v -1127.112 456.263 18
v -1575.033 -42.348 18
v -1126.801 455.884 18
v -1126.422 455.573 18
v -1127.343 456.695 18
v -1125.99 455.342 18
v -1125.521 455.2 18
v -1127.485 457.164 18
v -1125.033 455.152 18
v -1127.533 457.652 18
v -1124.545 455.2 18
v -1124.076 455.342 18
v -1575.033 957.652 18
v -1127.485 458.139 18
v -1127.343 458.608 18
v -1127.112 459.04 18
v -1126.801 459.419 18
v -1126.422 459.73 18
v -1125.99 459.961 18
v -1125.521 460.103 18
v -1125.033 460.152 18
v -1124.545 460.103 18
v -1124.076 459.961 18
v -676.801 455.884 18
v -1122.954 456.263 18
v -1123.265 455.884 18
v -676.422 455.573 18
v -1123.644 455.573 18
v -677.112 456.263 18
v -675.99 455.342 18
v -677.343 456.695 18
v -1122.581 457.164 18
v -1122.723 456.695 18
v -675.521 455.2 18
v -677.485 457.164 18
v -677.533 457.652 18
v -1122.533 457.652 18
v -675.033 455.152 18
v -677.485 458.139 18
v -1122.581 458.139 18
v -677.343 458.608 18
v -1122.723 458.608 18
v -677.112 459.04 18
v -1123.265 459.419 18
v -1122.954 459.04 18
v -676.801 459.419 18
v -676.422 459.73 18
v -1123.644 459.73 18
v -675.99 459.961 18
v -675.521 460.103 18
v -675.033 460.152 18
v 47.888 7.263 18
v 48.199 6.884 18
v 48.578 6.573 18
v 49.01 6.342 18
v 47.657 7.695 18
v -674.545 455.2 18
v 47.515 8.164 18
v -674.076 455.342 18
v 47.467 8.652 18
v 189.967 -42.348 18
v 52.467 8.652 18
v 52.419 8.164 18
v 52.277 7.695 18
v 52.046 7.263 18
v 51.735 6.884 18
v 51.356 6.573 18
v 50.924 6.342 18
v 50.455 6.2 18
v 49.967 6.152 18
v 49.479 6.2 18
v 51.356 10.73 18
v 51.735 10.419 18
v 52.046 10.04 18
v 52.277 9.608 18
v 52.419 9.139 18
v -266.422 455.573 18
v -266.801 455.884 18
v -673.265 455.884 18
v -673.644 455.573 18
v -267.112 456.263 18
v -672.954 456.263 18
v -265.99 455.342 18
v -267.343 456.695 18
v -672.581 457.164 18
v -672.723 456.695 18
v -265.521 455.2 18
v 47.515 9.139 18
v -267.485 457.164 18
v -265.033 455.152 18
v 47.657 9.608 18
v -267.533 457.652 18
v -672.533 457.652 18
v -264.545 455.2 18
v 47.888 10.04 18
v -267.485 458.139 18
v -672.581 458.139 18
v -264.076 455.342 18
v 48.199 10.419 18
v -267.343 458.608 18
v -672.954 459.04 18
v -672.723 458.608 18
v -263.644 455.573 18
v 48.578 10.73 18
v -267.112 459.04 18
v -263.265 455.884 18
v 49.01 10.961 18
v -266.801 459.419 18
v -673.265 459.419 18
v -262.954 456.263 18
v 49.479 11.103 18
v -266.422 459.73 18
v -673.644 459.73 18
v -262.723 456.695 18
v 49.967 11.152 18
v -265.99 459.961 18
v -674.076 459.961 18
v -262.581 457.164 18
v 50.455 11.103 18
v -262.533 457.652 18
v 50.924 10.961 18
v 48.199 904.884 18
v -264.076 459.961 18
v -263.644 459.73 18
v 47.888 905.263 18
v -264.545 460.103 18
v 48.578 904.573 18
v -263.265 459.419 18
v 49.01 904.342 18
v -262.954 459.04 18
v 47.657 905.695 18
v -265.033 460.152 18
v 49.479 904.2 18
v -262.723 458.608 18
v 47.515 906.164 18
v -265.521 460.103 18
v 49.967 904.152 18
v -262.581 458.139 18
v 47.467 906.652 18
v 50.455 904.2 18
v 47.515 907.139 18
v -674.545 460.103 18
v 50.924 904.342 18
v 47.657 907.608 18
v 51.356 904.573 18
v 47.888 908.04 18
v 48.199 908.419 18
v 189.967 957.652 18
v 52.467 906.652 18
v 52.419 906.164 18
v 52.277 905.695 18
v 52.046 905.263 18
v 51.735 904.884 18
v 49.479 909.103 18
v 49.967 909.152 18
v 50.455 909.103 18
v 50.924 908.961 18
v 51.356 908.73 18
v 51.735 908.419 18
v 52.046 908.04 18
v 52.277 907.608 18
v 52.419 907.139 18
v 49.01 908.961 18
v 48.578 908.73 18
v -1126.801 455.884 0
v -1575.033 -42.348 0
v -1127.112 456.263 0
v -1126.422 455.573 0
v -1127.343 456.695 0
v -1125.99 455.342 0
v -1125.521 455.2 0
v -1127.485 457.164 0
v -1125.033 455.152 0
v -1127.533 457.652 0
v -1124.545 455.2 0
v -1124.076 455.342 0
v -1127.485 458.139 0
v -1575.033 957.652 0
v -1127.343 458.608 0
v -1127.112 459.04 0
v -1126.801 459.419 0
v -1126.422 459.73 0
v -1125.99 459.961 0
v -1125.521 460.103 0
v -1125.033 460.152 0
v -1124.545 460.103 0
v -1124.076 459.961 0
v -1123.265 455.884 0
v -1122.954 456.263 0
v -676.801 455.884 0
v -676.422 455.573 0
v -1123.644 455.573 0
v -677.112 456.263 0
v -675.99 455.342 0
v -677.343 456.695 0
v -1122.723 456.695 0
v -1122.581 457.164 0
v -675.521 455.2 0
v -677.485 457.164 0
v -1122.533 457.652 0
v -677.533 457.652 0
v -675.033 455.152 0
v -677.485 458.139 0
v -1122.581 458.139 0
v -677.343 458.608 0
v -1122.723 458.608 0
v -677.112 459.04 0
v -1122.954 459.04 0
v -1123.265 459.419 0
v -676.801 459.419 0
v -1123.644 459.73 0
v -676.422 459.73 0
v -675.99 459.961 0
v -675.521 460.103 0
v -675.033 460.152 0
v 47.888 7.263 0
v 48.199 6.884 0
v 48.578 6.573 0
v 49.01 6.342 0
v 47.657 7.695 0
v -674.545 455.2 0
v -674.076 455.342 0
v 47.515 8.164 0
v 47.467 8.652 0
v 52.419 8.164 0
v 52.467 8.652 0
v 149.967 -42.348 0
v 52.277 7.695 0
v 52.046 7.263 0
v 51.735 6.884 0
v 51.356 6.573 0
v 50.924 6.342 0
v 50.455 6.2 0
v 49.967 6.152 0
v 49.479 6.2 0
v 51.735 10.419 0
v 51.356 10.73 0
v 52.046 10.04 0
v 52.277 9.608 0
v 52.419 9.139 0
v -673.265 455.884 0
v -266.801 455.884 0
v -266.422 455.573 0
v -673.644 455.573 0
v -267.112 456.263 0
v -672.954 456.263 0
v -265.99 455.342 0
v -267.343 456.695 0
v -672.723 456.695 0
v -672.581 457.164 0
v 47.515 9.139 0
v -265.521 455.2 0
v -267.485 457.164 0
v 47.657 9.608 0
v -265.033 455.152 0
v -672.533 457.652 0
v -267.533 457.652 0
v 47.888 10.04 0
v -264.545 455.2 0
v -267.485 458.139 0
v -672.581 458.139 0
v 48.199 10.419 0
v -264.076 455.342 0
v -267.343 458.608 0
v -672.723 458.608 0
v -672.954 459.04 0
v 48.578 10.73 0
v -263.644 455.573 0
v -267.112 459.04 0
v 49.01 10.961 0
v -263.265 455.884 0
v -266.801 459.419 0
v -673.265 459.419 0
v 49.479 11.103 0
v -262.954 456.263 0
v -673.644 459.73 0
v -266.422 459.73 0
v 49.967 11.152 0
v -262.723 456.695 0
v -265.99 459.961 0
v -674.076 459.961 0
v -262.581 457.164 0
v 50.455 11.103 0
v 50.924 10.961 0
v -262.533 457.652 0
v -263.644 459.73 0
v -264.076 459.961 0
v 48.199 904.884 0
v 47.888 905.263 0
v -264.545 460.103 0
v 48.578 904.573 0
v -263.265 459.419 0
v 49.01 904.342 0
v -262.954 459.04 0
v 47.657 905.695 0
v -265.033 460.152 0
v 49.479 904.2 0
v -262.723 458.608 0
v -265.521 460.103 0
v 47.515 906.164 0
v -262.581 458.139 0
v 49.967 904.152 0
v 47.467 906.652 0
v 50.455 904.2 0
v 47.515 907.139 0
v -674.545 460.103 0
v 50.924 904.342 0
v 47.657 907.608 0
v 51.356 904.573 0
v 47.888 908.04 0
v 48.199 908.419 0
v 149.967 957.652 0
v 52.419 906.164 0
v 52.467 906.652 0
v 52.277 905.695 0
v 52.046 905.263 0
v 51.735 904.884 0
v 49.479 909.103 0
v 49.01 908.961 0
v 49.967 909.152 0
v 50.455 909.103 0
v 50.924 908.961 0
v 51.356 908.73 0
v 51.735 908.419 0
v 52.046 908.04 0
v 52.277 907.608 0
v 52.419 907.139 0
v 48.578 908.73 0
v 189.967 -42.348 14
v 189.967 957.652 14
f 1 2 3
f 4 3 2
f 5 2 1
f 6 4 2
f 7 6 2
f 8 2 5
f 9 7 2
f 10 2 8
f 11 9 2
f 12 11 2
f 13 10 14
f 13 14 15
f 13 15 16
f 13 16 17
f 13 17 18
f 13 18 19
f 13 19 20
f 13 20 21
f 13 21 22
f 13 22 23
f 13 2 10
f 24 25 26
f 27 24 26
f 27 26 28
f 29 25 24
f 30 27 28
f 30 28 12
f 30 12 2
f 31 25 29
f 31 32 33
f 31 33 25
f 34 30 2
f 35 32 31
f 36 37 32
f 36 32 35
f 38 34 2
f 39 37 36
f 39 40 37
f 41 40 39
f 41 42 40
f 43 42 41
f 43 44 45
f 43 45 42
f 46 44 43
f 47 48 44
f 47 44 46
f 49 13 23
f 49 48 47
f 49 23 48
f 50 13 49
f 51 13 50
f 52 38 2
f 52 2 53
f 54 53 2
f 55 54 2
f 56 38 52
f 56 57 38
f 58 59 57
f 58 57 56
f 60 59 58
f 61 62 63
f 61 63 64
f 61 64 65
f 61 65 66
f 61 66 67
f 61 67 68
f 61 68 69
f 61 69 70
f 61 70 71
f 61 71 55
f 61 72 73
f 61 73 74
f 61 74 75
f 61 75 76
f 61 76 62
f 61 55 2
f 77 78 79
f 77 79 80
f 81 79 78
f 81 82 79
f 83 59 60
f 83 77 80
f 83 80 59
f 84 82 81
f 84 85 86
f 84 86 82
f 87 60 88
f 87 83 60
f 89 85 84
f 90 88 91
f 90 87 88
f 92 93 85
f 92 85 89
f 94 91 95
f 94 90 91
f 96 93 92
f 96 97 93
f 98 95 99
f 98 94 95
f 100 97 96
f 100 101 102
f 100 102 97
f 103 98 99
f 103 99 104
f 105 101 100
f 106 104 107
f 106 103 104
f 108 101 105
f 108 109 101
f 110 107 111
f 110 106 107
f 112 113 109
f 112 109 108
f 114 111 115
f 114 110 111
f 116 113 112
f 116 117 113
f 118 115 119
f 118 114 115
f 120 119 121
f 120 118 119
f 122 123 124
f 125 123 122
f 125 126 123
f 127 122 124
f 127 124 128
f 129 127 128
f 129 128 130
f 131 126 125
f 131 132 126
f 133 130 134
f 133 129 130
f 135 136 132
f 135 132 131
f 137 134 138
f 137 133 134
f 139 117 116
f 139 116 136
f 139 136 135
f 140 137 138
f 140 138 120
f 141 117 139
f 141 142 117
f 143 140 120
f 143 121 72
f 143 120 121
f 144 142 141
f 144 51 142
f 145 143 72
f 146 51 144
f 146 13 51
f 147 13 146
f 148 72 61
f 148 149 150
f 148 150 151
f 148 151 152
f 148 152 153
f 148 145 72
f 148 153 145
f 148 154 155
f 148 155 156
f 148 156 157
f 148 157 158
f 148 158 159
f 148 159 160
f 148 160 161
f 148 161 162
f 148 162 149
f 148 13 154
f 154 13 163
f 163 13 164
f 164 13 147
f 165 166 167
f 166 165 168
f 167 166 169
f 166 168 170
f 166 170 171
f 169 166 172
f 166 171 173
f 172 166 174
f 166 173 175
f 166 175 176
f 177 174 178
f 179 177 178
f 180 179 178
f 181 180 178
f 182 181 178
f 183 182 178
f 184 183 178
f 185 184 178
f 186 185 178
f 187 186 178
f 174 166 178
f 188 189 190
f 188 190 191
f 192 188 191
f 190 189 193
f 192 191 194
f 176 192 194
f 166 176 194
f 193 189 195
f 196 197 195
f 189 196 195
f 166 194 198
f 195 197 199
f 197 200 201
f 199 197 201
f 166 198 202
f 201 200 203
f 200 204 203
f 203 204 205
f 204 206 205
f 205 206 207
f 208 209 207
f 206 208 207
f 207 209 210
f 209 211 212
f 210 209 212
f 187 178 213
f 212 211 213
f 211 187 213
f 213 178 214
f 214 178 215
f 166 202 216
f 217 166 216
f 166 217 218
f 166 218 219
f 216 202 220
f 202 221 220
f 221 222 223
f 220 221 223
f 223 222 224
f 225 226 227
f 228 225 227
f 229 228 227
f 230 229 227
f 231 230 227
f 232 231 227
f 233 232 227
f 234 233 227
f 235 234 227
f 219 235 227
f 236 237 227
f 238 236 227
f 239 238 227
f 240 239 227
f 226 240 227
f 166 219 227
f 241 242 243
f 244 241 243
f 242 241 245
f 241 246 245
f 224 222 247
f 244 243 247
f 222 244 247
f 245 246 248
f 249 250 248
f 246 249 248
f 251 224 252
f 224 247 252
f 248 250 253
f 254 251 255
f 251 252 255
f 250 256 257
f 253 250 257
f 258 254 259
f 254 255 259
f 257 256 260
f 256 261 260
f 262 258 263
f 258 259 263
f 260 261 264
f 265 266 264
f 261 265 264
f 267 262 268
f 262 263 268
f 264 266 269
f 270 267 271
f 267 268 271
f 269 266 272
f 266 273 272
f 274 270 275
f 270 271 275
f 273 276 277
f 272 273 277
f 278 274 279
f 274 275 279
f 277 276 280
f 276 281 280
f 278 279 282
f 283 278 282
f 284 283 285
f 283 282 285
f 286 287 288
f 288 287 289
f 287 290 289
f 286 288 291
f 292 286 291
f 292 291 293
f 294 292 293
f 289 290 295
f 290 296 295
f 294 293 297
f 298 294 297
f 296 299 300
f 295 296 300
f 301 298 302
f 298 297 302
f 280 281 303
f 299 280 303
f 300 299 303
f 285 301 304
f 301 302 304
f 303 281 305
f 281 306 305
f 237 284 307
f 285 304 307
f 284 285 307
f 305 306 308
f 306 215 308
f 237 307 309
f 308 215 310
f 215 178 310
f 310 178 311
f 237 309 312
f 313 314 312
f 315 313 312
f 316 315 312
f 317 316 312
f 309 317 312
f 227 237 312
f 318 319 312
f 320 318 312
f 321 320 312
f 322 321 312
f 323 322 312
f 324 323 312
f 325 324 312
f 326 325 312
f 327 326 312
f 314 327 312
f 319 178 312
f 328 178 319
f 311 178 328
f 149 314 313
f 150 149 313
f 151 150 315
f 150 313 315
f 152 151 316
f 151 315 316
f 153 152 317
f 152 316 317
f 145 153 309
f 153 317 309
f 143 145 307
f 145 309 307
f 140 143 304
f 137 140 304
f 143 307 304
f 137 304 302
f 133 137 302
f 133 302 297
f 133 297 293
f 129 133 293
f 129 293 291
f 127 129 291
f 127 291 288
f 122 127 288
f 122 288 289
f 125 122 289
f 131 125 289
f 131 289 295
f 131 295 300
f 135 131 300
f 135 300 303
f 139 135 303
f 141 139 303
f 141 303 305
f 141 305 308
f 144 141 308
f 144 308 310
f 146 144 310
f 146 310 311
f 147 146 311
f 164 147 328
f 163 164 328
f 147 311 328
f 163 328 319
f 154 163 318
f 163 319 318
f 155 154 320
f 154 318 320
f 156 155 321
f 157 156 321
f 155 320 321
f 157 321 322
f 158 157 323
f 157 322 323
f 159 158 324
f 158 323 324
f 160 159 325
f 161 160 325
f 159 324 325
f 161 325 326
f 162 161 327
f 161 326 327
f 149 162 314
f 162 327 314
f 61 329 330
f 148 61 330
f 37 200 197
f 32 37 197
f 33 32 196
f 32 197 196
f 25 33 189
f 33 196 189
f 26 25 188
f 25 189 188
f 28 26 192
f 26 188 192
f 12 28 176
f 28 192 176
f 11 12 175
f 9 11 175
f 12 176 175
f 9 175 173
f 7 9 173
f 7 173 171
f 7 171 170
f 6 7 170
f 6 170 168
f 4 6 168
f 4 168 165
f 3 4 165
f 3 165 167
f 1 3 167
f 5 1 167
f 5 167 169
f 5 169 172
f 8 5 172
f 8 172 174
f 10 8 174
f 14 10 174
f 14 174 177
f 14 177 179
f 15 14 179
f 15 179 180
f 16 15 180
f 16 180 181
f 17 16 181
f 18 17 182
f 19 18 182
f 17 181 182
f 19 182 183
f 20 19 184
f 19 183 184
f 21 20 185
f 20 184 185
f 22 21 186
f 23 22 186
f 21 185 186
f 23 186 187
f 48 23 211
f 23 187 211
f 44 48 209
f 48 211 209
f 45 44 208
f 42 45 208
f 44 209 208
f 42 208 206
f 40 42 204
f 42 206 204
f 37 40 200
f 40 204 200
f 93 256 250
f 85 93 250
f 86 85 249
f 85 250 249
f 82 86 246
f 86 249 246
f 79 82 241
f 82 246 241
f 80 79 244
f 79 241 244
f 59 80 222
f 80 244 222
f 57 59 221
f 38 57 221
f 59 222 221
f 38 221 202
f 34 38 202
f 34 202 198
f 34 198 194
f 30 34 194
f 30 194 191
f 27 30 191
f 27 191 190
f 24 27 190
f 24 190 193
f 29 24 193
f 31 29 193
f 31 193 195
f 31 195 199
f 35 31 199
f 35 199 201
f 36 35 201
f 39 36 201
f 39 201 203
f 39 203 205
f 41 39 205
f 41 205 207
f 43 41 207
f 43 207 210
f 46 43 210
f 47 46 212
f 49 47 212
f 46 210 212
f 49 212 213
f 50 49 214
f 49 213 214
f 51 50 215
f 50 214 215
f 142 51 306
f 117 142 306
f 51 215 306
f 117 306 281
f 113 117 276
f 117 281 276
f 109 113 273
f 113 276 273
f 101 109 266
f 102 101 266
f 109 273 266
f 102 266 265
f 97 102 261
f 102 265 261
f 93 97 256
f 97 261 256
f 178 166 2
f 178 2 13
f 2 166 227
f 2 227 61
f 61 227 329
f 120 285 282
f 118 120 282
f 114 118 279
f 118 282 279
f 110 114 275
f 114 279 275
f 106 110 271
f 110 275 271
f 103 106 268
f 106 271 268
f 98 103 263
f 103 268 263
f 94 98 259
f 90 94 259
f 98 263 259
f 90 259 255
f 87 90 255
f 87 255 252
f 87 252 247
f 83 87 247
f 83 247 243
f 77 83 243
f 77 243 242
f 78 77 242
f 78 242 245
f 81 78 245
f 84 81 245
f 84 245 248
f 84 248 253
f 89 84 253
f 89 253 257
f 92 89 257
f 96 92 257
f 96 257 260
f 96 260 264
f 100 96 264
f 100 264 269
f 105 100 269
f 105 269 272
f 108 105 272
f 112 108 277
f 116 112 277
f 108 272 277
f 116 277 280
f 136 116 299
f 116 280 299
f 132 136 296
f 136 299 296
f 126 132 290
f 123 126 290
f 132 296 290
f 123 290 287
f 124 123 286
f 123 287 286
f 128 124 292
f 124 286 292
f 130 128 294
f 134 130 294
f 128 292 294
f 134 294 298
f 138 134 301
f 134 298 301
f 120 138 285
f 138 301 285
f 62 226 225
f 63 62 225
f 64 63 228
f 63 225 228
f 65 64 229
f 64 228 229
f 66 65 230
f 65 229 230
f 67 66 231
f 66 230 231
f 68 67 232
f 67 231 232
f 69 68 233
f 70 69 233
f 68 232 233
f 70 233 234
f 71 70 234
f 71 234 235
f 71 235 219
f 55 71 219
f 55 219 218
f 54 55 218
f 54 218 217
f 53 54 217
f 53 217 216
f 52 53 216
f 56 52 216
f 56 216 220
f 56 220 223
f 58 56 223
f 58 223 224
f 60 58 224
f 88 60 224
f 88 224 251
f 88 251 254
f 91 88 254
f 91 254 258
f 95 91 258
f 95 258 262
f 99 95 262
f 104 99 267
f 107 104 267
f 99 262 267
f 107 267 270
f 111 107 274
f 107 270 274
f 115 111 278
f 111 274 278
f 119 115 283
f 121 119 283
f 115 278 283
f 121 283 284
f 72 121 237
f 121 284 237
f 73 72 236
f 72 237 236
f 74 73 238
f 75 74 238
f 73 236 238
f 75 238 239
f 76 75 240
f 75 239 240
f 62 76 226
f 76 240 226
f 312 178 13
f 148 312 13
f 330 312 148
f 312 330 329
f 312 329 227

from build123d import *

# Parameters (mm, degrees)
F0_W     = 1765
F0_H     = 1000
F1_DEPTH = 18
F3_DEPTH = 1000.001
F4_R     = 2.5
F5_DEPTH = 25


with BuildPart() as f1:
    # F0 (on Top) → F1 (new body)
    with BuildSketch(Plane.XY):
        with Locations((-692.533048, 457.651515)):
            Rectangle(F0_W, F0_H)
    extrude(amount=F1_DEPTH)

    # F2 (on face) → F3 (cut, through all)
    with BuildSketch(Plane.XZ.offset(42.348485)):
        Polygon((189.966952, 0), (189.966952, 14), (149.966952, 0), align=None)
    extrude(amount=-F3_DEPTH, mode=Mode.SUBTRACT)

    # F4 (on face) → F5 (cut)
    with BuildSketch(Plane(origin=(0, 0, 0), x_dir=(1, 0, 0), z_dir=(0, 0, -1))):
        with Locations((49.966952, -8.651515)):
            Circle(F4_R)
        with Locations((49.966952, -906.651515)):
            Circle(F4_R)
        with Locations((-675.033048, -457.651515)):
            Circle(F4_R)
        with Locations((-265.033048, -457.651515)):
            Circle(F4_R)
        with Locations((-1125.033048, -457.651515)):
            Circle(F4_R)
    extrude(amount=-F5_DEPTH, mode=Mode.SUBTRACT)


solid = f1.part
